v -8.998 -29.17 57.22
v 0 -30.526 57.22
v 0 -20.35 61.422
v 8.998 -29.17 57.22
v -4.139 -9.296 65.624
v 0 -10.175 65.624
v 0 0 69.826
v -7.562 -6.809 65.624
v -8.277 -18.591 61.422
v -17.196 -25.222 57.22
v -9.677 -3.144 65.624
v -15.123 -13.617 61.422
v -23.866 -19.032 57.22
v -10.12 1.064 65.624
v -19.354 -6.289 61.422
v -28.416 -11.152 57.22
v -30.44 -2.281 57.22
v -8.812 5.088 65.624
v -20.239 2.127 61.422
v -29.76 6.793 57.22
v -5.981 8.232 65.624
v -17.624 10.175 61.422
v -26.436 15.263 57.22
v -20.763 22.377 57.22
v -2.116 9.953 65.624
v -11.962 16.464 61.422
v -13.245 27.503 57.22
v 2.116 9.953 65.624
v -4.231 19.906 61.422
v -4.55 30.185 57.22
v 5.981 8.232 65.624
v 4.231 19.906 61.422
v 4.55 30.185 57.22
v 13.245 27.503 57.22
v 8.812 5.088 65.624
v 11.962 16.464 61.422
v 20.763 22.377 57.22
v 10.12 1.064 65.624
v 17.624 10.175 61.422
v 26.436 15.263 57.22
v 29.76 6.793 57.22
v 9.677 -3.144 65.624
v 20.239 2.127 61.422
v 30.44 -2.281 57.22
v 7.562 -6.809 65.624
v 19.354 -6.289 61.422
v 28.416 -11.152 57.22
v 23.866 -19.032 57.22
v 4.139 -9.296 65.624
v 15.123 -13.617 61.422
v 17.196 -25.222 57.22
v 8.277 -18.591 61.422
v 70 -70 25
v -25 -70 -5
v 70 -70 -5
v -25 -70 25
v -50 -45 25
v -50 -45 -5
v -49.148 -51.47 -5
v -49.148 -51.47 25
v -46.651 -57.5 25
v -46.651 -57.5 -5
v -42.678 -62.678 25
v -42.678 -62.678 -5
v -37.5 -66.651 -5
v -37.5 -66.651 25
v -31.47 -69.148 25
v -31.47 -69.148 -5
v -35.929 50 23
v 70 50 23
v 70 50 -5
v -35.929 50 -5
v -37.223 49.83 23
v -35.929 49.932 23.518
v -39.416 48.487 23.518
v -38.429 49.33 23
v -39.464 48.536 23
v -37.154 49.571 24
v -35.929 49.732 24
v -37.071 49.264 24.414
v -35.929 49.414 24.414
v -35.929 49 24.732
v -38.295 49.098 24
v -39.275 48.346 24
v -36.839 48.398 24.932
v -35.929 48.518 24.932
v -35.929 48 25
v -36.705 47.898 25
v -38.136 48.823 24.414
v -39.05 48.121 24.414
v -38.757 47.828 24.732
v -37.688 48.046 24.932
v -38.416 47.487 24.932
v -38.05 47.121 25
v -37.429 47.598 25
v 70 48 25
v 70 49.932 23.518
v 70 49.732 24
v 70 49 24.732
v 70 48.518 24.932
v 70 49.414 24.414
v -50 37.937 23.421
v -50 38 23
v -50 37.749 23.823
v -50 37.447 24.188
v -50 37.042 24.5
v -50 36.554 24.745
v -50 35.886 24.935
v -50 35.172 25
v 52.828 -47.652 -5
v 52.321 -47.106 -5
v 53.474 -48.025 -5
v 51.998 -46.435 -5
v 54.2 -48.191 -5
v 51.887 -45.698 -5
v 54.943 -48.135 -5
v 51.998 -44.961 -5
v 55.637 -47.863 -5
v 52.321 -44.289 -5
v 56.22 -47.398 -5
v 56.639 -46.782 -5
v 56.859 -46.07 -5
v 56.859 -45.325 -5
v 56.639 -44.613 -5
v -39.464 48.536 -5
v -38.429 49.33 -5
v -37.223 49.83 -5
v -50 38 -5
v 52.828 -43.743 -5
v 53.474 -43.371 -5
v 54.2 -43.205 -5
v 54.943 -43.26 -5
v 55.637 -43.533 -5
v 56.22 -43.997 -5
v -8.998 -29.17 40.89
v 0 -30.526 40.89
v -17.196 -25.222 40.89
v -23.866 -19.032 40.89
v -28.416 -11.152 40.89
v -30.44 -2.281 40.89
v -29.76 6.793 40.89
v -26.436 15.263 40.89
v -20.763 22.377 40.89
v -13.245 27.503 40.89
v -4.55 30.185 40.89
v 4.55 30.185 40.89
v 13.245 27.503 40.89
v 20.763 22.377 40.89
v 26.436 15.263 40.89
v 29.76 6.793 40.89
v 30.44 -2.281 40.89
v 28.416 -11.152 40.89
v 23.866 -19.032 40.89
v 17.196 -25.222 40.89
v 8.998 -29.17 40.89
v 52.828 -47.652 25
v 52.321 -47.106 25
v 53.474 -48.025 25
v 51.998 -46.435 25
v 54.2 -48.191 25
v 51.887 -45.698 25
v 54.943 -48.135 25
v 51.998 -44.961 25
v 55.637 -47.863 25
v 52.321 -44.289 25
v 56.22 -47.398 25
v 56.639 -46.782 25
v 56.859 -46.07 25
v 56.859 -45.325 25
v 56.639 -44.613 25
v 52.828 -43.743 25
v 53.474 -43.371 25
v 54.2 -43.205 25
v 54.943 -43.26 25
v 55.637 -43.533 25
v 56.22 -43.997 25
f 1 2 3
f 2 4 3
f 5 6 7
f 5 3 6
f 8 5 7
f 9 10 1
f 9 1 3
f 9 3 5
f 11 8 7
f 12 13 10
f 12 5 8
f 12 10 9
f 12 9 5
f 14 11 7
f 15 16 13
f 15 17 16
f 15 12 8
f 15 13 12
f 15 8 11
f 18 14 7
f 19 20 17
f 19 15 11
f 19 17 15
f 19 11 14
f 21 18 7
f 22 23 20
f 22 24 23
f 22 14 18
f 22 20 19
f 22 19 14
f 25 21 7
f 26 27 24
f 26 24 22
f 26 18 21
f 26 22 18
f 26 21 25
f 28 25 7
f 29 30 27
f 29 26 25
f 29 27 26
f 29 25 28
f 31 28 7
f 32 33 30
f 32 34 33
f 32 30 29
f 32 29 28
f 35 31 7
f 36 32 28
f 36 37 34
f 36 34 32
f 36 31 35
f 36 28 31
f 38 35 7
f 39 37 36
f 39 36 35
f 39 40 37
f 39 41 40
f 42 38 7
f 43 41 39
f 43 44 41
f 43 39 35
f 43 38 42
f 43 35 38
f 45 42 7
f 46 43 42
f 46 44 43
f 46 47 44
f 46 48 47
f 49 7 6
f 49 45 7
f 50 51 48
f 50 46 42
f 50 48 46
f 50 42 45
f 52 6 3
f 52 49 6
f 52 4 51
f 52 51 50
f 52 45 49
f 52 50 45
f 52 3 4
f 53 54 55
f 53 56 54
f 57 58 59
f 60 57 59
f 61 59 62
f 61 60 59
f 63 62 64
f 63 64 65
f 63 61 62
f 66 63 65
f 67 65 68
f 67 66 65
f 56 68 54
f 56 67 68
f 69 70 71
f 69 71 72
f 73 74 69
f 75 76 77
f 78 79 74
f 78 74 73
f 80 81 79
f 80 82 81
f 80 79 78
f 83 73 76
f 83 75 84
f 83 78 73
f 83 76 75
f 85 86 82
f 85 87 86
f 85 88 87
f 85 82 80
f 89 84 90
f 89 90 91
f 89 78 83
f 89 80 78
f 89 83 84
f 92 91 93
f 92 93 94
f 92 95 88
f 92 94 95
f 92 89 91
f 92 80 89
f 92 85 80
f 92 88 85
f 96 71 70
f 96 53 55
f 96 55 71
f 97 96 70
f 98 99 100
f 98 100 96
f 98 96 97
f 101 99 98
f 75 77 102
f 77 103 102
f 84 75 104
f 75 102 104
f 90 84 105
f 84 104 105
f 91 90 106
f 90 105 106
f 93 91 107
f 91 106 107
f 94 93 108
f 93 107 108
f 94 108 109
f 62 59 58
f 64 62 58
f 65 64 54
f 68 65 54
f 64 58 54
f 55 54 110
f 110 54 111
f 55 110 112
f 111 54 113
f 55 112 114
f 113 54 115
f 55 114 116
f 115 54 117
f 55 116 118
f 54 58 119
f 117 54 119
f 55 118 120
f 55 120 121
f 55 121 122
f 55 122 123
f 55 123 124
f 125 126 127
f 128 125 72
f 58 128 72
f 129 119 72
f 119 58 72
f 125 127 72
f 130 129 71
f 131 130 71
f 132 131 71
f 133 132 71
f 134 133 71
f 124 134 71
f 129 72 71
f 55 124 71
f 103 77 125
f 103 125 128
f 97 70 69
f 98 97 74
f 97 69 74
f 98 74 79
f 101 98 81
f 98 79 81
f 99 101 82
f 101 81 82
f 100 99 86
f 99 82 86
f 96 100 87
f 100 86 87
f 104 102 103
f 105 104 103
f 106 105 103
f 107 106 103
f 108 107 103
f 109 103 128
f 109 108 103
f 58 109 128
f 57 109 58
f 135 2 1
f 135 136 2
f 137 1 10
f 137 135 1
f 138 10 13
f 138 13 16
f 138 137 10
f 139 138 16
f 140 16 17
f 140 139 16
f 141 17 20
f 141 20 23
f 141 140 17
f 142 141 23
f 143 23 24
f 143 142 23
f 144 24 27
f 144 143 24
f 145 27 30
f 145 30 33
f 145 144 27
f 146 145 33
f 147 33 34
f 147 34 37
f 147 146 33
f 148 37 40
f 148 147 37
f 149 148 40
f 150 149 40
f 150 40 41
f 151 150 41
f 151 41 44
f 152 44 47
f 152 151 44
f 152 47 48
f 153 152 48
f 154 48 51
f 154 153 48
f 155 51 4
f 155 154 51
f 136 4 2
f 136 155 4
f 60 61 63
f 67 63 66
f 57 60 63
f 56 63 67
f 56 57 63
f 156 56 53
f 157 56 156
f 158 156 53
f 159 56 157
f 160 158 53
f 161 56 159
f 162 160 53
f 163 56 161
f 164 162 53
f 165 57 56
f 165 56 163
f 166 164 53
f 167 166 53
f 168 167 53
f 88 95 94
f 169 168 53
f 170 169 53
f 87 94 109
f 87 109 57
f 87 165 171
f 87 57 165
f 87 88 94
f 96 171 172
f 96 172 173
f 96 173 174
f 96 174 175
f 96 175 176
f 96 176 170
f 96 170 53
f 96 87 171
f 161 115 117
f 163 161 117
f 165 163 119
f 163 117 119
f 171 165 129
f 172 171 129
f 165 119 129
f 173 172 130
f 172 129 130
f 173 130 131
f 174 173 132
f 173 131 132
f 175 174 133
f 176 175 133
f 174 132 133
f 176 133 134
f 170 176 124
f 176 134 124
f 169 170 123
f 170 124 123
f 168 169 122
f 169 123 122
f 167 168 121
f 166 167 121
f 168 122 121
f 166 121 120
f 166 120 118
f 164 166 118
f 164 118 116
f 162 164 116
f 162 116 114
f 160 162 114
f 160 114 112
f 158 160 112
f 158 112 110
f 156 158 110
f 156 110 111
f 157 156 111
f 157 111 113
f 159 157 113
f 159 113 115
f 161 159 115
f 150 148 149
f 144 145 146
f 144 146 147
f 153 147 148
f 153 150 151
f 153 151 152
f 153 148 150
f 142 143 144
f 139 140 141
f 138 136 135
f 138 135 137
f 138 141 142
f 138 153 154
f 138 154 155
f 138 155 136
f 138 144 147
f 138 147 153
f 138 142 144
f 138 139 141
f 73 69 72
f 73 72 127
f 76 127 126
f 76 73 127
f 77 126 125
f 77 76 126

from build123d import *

# Parameters (mm, degrees)
F1_DEPTH = 25
F2_DEPTH = 5
F5_R     = 2
F7_D     = 5


with BuildPart() as f1:
    # F0 (on Top) → F1 (new body)
    with BuildSketch(Plane.XY):
        with BuildLine():
            Line((70, 50), (-35.928932, 50))
            ThreePointArc((-35.928932, 50), (-37.842349, 49.619398), (-39.464466, 48.535534))
            Line((-39.464466, 48.535534), (-50, 38))
            Line((-50, 38), (-50, -45))
            ThreePointArc((-50, -45), (-42.67767, -62.67767), (-25, -70))
            Line((-25, -70), (70, -70))
            Line((70, -70), (70, 50))
        make_face()
    extrude(amount=F1_DEPTH)

    # F0 (on Top) → F2 (join)
    with BuildSketch(Plane.XY):
        with BuildLine():
            Line((70, 50), (-35.928932, 50))
            ThreePointArc((-35.928932, 50), (-37.842349, 49.619398), (-39.464466, 48.535534))
            Line((-39.464466, 48.535534), (-50, 38))
            Line((-50, 38), (-50, -45))
            ThreePointArc((-50, -45), (-42.67767, -62.67767), (-25, -70))
            Line((-25, -70), (70, -70))
            Line((70, -70), (70, 50))
        make_face()
    extrude(amount=-F2_DEPTH)

    # F5
    f5_edges = [f1.edges().sort_by_distance(p)[0] for p in [
        (17.035534, 50, 25),
    ]]
    fillet(f5_edges, radius=F5_R)

    # F7 (through all)
    with Locations(Plane.XY.offset(25)):
        with Locations((54.386906, -45.697726)):
            Hole(F7_D / 2)


with BuildPart() as f4:
    # F3 (on Right) → F4 (revolve)
    with BuildSketch(Plane.YZ):
        Polygon((-30.525748, 40.890129), (0, 40.890129), (0, 69.826104), (-30.525748, 57.220329), align=None)
    revolve(axis=Axis((0, 0, 55.358116), (0, 0, -1)))


solid = Compound([f1.part, f4.part])
